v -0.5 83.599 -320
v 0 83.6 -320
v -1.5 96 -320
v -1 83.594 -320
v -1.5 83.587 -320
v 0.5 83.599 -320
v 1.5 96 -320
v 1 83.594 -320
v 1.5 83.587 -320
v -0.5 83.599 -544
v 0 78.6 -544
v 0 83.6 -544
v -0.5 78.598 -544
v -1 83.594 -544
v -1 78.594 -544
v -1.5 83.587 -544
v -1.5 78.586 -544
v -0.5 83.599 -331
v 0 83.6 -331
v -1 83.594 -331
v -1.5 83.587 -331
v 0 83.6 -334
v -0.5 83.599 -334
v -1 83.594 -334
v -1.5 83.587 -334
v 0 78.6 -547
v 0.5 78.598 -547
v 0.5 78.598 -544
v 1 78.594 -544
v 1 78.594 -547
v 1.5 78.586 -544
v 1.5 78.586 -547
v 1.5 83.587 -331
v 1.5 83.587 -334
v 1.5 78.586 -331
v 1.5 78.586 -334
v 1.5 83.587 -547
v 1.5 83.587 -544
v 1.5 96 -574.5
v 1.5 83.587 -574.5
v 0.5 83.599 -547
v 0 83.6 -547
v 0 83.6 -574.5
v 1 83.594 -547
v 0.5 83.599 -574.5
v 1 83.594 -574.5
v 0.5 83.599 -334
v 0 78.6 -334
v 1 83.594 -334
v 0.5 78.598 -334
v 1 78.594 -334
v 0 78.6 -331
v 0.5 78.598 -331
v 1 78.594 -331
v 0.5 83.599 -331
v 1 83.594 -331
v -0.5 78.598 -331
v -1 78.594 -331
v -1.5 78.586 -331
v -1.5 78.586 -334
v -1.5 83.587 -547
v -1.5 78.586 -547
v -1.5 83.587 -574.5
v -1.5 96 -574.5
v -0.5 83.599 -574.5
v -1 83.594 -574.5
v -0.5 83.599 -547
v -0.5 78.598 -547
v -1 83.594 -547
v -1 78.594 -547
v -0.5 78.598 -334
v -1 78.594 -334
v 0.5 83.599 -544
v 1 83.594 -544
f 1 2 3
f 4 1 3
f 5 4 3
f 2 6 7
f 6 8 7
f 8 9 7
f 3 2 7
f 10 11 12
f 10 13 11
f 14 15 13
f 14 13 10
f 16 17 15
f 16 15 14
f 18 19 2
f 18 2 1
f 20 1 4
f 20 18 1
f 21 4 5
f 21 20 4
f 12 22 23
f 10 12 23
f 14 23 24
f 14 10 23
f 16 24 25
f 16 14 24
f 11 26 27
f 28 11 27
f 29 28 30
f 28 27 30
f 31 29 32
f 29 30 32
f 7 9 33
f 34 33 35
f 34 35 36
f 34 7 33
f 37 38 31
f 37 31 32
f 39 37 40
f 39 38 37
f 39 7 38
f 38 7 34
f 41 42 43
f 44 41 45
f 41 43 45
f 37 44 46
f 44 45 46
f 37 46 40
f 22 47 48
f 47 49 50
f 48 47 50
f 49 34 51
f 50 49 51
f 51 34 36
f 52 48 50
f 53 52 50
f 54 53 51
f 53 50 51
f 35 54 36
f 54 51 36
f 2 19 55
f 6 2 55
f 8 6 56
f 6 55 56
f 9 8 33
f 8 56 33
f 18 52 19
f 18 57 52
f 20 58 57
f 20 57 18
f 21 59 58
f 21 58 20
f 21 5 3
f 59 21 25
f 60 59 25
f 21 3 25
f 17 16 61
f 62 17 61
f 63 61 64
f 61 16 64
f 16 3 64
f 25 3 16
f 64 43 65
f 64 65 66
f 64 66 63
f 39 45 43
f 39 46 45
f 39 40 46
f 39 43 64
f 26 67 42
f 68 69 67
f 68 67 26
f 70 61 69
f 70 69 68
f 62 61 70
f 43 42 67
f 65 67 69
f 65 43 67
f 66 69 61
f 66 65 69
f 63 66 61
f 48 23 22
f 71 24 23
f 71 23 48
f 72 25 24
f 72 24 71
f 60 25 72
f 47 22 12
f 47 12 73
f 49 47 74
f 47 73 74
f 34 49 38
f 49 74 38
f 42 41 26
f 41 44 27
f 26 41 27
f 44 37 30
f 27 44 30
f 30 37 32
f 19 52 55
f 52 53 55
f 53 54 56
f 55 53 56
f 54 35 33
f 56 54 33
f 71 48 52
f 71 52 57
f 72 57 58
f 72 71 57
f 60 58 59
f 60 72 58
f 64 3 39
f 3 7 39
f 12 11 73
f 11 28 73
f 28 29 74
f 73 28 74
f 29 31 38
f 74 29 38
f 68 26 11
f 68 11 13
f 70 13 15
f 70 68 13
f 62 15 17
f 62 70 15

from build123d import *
from build123d.topology import SkipClean

# Parameters (mm, degrees)
SKETCH1_W           = 254.5
SKETCH1_H           = 20
BOSS_EXTRUDE1_DEPTH = 1.5
CUT_REVOLVE1_ANGLE  = 360


with BuildPart() as part:
    # Sketch1 → Boss-Extrude1 (new body, symmetric)
    with BuildSketch(Plane(origin=(0, 0, 0), x_dir=(0, 0, -1), z_dir=(1, 0, 0))):
        with Locations((447.25, 86)):
            Rectangle(SKETCH1_W, SKETCH1_H)
    extrude(amount=BOSS_EXTRUDE1_DEPTH, both=True)

    # Sketch2 → Cut-Revolve1 (revolve, symmetric, cut)
    with SkipClean():  # keep this step's faces unmerged: merging them makes the solid invalid here
        with BuildSketch(Plane(origin=(0, 0, 0), x_dir=(0, 0, -1), z_dir=(1, 0, 0))) as cut_revolve1_sk:
            Polygon((320, 83.6), (331, 83.6), (331, 78.6), (334, 78.6), (334, 83.6), (544, 83.6), (544, 78.6), (547, 78.6), (547, 83.6), (574.5, 83.6), (574.5, 65.235756371), (320, 65.235756371), align=None)
        revolve(axis=Axis((0, 0, 0), (0, 0, -1)), revolution_arc=CUT_REVOLVE1_ANGLE / 2, mode=Mode.SUBTRACT)
        revolve(cut_revolve1_sk.sketch, axis=Axis((0, 0, 0), (0, 0, 1)), revolution_arc=CUT_REVOLVE1_ANGLE / 2, mode=Mode.SUBTRACT)


solid = part.part
